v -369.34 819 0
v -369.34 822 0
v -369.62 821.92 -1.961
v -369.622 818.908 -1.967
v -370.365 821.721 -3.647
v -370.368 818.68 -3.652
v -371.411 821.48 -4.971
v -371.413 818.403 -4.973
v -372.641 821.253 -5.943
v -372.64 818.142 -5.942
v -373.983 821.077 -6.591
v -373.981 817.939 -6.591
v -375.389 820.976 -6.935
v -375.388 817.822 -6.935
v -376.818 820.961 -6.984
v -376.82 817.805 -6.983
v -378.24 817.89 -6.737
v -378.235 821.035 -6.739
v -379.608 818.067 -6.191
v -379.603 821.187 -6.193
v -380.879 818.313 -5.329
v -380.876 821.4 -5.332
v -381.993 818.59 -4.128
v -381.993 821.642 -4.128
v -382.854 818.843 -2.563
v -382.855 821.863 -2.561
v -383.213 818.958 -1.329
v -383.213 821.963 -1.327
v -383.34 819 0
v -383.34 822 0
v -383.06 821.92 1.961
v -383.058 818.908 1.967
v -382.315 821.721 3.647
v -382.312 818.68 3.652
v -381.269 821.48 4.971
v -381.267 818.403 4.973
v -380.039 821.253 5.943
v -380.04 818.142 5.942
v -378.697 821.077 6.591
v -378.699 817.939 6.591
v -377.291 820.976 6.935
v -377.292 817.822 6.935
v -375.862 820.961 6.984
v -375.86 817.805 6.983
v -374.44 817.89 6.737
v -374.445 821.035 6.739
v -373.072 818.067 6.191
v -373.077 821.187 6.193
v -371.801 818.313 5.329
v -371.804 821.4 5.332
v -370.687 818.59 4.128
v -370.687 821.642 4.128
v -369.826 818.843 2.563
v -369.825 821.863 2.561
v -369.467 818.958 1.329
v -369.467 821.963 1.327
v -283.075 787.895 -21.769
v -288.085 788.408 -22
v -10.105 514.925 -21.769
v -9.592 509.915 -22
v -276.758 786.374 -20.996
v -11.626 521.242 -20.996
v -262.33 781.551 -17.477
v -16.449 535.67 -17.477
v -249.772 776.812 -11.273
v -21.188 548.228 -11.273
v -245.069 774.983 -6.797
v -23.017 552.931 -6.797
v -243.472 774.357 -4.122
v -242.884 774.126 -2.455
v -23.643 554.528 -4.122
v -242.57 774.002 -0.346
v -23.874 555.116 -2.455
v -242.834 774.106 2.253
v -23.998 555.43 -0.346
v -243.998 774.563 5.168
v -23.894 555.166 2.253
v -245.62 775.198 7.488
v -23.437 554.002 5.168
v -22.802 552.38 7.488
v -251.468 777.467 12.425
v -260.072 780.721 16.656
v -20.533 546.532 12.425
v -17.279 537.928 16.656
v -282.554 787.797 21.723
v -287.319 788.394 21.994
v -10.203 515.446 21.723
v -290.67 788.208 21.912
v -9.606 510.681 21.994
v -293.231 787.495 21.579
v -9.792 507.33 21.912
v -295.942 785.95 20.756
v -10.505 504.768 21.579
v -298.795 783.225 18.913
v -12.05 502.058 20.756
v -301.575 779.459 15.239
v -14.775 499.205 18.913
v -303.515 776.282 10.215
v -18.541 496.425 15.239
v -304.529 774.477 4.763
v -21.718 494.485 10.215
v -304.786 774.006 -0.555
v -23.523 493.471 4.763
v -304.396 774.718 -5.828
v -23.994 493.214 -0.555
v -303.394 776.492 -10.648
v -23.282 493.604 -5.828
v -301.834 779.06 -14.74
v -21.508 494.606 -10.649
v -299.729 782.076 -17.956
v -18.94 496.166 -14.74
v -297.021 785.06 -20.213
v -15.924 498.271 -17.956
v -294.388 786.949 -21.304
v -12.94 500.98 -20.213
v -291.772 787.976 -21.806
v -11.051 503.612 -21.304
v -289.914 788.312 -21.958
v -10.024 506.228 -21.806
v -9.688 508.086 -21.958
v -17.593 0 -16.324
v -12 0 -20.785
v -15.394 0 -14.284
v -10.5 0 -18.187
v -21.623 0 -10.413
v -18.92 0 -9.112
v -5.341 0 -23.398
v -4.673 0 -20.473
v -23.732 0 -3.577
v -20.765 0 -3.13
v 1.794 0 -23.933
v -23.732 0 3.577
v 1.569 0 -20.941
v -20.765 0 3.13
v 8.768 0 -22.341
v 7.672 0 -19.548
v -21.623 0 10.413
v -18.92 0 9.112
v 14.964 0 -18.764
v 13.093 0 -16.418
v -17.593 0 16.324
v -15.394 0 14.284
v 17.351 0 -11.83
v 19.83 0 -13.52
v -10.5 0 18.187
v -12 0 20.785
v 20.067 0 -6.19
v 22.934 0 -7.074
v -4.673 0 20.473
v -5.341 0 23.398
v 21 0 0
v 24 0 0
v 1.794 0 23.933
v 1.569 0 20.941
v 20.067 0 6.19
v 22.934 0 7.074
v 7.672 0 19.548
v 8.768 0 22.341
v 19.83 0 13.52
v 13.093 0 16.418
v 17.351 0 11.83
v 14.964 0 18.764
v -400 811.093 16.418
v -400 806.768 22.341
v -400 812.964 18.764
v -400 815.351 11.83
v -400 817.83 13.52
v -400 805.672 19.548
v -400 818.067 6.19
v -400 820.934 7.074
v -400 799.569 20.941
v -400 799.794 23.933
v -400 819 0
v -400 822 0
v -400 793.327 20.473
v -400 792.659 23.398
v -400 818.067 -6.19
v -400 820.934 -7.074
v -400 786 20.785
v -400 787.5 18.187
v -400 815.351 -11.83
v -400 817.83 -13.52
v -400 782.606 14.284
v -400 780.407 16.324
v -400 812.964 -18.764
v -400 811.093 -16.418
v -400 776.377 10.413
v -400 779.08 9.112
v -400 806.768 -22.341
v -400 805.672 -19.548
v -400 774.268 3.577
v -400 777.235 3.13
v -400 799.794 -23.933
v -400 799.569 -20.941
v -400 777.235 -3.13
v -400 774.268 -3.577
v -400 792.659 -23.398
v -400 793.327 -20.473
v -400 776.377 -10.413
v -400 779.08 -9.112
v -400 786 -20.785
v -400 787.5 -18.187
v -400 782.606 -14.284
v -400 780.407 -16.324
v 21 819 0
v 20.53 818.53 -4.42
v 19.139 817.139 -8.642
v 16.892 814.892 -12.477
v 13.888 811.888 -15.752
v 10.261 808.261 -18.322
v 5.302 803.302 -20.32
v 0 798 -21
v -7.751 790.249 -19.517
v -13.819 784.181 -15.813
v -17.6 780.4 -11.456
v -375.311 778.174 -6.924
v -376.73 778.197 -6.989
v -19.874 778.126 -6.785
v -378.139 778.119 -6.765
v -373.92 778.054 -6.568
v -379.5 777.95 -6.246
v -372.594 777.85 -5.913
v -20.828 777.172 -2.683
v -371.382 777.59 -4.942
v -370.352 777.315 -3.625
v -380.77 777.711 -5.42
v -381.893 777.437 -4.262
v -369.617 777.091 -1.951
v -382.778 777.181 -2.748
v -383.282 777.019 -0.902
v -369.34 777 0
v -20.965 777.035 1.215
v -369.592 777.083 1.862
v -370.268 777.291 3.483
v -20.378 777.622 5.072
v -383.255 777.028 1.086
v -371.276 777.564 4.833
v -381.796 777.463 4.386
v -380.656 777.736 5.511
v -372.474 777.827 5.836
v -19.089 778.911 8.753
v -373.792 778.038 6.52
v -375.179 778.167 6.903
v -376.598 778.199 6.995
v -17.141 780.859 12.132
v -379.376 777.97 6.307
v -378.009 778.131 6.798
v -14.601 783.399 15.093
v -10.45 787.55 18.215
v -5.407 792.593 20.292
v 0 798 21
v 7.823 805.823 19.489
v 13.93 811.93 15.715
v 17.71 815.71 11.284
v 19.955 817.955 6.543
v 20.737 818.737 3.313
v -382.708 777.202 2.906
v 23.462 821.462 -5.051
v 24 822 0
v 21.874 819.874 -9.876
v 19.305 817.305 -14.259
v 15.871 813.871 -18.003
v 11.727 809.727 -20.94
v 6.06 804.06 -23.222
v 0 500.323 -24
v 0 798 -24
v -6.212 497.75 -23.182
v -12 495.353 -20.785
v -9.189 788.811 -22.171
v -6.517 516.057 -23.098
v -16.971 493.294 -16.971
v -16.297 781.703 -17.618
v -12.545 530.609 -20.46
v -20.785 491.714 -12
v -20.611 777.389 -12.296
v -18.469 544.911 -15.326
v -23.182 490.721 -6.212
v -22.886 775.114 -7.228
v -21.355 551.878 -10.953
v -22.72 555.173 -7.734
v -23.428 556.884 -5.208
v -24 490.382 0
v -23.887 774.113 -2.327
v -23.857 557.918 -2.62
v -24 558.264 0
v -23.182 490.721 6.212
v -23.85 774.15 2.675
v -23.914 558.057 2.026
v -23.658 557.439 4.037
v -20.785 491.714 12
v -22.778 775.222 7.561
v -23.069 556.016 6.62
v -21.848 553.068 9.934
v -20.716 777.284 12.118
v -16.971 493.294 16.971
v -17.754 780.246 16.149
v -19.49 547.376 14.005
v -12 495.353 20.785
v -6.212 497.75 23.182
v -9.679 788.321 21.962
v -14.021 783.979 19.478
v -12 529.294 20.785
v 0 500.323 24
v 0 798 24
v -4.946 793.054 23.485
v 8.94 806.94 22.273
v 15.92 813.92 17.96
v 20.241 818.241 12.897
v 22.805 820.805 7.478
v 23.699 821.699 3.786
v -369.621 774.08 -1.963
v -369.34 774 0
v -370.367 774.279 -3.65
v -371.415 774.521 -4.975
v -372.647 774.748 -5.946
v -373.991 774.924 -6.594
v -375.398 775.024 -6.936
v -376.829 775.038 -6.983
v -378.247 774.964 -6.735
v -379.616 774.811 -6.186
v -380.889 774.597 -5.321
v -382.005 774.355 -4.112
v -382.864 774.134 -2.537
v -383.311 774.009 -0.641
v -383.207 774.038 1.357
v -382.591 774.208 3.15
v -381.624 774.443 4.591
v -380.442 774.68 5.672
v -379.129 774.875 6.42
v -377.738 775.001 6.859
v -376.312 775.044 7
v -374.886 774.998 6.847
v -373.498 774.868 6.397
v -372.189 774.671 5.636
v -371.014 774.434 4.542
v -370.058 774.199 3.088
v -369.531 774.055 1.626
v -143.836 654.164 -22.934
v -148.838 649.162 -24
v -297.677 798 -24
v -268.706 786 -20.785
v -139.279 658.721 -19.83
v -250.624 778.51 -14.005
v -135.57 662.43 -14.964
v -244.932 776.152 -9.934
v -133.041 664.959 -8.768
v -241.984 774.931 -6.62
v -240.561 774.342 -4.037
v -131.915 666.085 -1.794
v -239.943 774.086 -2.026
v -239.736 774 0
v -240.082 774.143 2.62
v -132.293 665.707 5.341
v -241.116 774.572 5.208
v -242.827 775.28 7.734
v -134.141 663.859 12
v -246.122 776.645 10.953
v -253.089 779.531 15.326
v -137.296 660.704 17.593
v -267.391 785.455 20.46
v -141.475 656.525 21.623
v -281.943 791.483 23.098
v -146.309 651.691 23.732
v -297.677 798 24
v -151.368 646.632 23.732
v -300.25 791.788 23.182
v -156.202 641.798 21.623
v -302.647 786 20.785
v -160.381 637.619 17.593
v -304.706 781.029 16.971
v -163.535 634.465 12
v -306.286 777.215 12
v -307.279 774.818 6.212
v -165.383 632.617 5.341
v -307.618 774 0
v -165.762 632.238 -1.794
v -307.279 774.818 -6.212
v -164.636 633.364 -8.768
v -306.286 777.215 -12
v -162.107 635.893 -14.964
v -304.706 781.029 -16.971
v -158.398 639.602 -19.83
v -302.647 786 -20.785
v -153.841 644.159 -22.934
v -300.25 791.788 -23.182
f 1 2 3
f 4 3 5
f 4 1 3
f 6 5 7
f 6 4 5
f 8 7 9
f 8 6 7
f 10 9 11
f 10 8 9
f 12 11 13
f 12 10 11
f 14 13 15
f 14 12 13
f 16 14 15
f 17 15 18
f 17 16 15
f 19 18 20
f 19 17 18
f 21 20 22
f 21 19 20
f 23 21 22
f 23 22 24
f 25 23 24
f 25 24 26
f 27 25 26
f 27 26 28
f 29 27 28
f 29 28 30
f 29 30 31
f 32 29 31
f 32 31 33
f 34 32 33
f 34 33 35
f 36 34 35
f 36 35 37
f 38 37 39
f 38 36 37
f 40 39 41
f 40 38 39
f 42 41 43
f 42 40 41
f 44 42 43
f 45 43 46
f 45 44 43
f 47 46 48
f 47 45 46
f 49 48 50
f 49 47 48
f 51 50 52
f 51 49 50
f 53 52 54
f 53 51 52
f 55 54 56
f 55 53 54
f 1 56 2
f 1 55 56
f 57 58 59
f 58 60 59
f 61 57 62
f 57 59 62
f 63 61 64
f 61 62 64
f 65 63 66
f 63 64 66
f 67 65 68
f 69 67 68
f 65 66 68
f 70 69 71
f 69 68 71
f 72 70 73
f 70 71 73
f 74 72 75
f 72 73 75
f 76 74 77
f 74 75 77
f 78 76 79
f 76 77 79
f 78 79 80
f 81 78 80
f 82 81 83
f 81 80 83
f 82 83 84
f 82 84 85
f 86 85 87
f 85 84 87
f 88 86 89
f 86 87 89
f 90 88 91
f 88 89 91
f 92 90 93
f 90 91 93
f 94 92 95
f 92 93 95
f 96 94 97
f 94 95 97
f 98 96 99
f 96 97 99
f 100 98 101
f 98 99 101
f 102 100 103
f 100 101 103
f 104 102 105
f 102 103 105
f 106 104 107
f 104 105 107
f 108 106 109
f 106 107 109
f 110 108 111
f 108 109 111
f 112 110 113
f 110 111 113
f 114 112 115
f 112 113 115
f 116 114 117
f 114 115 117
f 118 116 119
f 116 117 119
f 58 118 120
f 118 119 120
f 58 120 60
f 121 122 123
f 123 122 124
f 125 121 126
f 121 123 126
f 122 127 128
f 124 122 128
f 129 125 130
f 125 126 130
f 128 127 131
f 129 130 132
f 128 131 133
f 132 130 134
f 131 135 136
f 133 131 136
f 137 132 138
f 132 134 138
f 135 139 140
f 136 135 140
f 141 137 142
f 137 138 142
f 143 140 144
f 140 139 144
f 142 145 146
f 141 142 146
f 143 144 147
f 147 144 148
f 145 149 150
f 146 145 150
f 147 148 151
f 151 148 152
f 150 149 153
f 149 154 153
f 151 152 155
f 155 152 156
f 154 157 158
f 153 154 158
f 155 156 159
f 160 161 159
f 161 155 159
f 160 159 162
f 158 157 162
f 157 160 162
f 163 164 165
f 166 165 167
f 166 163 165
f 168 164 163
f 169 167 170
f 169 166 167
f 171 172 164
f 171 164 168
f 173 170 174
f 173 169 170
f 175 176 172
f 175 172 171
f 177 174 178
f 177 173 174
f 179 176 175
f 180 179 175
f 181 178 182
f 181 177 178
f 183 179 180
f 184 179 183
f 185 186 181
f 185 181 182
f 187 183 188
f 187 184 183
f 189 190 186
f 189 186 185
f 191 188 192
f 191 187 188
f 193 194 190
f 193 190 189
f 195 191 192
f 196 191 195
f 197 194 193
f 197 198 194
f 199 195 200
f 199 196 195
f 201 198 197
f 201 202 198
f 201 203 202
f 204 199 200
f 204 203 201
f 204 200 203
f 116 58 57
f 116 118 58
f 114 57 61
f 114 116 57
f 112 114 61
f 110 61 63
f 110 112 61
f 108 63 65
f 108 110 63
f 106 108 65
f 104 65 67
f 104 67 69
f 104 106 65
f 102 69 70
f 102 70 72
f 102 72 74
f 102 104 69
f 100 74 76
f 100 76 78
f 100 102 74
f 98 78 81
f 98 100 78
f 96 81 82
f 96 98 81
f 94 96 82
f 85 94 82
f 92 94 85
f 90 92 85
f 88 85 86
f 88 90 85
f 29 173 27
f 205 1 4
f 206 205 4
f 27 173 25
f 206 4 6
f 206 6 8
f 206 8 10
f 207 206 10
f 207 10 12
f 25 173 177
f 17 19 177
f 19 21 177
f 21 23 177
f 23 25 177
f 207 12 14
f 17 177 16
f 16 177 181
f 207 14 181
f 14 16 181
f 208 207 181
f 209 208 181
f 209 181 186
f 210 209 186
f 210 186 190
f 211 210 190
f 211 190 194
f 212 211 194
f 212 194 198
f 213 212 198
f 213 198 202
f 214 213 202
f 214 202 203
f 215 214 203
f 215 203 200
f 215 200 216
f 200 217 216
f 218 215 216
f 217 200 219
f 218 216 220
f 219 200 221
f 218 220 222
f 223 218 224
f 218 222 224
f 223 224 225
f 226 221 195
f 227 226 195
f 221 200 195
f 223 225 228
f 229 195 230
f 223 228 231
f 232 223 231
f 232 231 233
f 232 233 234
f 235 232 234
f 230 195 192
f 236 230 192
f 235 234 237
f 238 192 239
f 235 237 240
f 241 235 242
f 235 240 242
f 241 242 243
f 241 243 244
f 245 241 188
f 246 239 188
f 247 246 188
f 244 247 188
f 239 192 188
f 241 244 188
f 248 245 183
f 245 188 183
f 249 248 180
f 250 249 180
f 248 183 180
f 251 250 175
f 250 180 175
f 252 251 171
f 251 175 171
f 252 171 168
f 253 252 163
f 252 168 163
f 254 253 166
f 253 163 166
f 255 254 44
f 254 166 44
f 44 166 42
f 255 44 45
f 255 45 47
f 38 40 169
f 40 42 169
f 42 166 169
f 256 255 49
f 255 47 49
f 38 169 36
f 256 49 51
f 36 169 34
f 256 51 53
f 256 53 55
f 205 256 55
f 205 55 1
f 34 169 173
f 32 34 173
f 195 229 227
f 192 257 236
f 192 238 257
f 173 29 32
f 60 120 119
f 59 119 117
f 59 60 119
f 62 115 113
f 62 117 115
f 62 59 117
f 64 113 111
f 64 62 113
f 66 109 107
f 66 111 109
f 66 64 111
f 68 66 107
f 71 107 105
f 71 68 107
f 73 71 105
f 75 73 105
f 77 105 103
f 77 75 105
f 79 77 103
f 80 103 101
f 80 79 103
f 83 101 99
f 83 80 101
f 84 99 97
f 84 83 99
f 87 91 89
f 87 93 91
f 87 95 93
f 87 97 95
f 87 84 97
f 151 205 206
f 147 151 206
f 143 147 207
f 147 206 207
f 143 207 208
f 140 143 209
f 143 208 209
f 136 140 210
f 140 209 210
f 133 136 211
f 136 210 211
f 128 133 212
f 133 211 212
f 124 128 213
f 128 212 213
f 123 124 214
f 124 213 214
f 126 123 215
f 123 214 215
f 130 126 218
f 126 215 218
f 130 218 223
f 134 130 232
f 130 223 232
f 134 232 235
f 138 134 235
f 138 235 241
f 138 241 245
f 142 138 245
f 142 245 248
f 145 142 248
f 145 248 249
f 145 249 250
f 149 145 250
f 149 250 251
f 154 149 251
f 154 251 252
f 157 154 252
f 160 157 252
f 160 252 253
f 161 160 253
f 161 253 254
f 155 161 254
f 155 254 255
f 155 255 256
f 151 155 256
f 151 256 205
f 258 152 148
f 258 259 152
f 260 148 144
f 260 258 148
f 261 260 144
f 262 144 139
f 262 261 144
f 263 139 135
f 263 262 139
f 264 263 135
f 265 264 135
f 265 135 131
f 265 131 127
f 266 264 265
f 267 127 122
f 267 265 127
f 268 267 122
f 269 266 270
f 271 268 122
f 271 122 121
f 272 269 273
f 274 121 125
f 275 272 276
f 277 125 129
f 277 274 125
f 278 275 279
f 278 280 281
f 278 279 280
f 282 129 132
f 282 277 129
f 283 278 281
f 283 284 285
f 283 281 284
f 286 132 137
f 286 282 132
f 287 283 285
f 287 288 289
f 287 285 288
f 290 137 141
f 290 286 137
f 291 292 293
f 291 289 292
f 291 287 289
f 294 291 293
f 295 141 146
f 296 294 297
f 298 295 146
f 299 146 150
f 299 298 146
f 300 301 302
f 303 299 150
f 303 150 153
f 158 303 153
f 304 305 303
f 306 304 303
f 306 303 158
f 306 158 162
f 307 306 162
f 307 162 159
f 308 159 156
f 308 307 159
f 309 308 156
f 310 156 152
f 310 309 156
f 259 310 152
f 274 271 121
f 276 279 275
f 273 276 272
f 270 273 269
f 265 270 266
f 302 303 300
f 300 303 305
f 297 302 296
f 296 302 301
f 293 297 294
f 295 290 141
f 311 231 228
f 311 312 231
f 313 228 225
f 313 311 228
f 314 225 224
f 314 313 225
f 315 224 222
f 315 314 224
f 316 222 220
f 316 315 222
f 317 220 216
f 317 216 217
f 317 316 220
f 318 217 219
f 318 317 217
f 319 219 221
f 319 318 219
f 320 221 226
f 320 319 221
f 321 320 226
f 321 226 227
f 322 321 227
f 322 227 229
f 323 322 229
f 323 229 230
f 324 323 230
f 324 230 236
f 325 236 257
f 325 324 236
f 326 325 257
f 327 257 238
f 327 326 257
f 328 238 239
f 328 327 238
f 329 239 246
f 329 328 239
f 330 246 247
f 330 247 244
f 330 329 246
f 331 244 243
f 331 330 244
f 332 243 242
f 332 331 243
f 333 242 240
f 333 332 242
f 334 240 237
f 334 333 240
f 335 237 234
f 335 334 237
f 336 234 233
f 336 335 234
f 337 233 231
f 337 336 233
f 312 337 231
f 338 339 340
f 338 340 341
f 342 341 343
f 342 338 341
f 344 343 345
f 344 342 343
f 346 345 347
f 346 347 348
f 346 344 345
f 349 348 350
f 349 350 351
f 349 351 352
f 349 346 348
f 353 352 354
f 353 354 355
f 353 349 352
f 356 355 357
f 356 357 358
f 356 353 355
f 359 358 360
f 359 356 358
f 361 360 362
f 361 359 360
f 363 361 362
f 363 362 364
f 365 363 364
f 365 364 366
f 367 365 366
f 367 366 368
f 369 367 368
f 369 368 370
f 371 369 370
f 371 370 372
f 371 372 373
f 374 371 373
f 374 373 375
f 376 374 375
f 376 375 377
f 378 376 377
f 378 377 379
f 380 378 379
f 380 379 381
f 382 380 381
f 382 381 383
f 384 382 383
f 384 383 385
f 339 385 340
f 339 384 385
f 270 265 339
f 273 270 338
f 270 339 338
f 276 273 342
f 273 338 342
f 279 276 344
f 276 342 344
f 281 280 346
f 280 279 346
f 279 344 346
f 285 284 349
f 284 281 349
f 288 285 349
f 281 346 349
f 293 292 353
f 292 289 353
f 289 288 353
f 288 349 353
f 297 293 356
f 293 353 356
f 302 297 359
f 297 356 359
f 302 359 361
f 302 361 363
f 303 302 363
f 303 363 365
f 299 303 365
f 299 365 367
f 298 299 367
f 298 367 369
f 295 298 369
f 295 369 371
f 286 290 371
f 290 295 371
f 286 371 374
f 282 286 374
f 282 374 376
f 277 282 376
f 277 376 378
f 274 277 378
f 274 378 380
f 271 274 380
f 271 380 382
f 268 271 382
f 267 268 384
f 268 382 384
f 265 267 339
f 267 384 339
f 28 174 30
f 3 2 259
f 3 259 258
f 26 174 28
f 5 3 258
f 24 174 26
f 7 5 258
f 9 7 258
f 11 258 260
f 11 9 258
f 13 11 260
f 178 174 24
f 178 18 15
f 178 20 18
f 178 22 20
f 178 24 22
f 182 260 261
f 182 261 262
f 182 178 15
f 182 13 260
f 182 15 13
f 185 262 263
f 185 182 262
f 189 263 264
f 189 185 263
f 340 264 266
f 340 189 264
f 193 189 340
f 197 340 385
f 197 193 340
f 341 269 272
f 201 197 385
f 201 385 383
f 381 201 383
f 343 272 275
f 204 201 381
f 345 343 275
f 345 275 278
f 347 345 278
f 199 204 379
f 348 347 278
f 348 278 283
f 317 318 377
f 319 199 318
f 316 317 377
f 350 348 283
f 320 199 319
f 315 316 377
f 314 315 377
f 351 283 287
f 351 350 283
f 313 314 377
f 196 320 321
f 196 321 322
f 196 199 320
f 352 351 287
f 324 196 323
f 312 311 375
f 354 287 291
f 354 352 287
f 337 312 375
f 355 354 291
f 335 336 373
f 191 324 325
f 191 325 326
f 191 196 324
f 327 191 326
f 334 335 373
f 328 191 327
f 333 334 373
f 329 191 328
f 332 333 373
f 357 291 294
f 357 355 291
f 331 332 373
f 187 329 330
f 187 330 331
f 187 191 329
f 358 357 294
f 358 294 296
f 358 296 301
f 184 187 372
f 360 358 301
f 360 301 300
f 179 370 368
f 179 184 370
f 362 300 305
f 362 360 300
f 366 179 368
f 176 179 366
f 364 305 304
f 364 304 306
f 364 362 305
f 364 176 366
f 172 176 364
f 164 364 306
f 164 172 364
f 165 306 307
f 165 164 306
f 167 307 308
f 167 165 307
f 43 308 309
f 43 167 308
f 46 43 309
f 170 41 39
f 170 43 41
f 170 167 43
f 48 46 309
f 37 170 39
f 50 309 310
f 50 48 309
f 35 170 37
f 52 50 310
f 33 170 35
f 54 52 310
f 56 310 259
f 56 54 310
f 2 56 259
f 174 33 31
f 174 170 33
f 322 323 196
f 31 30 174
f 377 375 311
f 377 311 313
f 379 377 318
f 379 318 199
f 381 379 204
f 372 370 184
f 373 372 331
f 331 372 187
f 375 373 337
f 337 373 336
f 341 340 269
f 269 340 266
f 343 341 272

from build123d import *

# Parameters (mm, degrees)
SKETCH2_R                       = 24
SKETCH2_R_2                     = 21
EXTRUDE_THIN4_REACH             = 583.242
SKETCH3_R                       = 24
SKETCH3_R_2                     = 22
EXTRUDE_THIN4_DIRECTION_2_REACH = 301.813
SKETCH4_R                       = 7
CUT_EXTRUDE1_DEPTH              = 823


with BuildPart() as part:
    # Sweep-Thin1: sweep along a path in Sketch1
    with BuildLine(Plane.XY) as sweep_thin1_path:
        Line((0, 0), (0, 798))
        Line((0, 798), (-400, 798))
    # Sketch2 → Sweep-Thin1 (sweep)
    with BuildSketch(Plane(origin=(0, 0, 0), x_dir=(1, 0, 0), z_dir=(0, 1, 0))):
        Circle(SKETCH2_R)
        Circle(SKETCH2_R_2, mode=Mode.SUBTRACT)
    sweep(path=sweep_thin1_path.line, transition=Transition.RIGHT)

    # Sketch3 → Extrude-Thin4 (add, up to next)
    with BuildSketch(Plane(origin=(-399, 399, 0), x_dir=(0, 0, -1), z_dir=(0.707106781, -0.707106781, 0)), mode=Mode.PRIVATE) as extrude_thin4_sk1:
        with Locations((0, 353.781901472)):
            Circle(SKETCH3_R)
        with Locations((0, 353.781901472)):
            Circle(SKETCH3_R_2, mode=Mode.SUBTRACT)
    extrude_thin4_tool1 = extrude(extrude_thin4_sk1.sketch, amount=EXTRUDE_THIN4_REACH, mode=Mode.PRIVATE) - part.part
    add(extrude_thin4_tool1.solids().sort_by_distance((-148.838418, 649.161582, 23.321177))[0])

    # Sketch3 → Extrude-Thin4 direction 2 (add, up to next)
    with BuildSketch(Plane(origin=(-399, 399, 0), x_dir=(0, 0, -1), z_dir=(0.707106781, -0.707106781, 0)), mode=Mode.PRIVATE) as extrude_thin4_direction_2_sk1:
        with Locations((0, 353.781901472)):
            Circle(SKETCH3_R)
        with Locations((0, 353.781901472)):
            Circle(SKETCH3_R_2, mode=Mode.SUBTRACT)
    extrude_thin4_direction_2_tool1 = extrude(extrude_thin4_direction_2_sk1.sketch, amount=-EXTRUDE_THIN4_DIRECTION_2_REACH, mode=Mode.PRIVATE) - part.part
    add(extrude_thin4_direction_2_tool1.solids().sort_by_distance((-148.838418, 649.161582, 23.321177))[0])

    # Sketch4 → Cut-Extrude1 (cut, through all)
    with BuildSketch(Plane(origin=(0, 0, 0), x_dir=(1, 0, 0), z_dir=(0, 1, 0))):
        with Locations((-376.34, 0)):
            Circle(SKETCH4_R)
    extrude(amount=CUT_EXTRUDE1_DEPTH, mode=Mode.SUBTRACT)


solid = part.part
